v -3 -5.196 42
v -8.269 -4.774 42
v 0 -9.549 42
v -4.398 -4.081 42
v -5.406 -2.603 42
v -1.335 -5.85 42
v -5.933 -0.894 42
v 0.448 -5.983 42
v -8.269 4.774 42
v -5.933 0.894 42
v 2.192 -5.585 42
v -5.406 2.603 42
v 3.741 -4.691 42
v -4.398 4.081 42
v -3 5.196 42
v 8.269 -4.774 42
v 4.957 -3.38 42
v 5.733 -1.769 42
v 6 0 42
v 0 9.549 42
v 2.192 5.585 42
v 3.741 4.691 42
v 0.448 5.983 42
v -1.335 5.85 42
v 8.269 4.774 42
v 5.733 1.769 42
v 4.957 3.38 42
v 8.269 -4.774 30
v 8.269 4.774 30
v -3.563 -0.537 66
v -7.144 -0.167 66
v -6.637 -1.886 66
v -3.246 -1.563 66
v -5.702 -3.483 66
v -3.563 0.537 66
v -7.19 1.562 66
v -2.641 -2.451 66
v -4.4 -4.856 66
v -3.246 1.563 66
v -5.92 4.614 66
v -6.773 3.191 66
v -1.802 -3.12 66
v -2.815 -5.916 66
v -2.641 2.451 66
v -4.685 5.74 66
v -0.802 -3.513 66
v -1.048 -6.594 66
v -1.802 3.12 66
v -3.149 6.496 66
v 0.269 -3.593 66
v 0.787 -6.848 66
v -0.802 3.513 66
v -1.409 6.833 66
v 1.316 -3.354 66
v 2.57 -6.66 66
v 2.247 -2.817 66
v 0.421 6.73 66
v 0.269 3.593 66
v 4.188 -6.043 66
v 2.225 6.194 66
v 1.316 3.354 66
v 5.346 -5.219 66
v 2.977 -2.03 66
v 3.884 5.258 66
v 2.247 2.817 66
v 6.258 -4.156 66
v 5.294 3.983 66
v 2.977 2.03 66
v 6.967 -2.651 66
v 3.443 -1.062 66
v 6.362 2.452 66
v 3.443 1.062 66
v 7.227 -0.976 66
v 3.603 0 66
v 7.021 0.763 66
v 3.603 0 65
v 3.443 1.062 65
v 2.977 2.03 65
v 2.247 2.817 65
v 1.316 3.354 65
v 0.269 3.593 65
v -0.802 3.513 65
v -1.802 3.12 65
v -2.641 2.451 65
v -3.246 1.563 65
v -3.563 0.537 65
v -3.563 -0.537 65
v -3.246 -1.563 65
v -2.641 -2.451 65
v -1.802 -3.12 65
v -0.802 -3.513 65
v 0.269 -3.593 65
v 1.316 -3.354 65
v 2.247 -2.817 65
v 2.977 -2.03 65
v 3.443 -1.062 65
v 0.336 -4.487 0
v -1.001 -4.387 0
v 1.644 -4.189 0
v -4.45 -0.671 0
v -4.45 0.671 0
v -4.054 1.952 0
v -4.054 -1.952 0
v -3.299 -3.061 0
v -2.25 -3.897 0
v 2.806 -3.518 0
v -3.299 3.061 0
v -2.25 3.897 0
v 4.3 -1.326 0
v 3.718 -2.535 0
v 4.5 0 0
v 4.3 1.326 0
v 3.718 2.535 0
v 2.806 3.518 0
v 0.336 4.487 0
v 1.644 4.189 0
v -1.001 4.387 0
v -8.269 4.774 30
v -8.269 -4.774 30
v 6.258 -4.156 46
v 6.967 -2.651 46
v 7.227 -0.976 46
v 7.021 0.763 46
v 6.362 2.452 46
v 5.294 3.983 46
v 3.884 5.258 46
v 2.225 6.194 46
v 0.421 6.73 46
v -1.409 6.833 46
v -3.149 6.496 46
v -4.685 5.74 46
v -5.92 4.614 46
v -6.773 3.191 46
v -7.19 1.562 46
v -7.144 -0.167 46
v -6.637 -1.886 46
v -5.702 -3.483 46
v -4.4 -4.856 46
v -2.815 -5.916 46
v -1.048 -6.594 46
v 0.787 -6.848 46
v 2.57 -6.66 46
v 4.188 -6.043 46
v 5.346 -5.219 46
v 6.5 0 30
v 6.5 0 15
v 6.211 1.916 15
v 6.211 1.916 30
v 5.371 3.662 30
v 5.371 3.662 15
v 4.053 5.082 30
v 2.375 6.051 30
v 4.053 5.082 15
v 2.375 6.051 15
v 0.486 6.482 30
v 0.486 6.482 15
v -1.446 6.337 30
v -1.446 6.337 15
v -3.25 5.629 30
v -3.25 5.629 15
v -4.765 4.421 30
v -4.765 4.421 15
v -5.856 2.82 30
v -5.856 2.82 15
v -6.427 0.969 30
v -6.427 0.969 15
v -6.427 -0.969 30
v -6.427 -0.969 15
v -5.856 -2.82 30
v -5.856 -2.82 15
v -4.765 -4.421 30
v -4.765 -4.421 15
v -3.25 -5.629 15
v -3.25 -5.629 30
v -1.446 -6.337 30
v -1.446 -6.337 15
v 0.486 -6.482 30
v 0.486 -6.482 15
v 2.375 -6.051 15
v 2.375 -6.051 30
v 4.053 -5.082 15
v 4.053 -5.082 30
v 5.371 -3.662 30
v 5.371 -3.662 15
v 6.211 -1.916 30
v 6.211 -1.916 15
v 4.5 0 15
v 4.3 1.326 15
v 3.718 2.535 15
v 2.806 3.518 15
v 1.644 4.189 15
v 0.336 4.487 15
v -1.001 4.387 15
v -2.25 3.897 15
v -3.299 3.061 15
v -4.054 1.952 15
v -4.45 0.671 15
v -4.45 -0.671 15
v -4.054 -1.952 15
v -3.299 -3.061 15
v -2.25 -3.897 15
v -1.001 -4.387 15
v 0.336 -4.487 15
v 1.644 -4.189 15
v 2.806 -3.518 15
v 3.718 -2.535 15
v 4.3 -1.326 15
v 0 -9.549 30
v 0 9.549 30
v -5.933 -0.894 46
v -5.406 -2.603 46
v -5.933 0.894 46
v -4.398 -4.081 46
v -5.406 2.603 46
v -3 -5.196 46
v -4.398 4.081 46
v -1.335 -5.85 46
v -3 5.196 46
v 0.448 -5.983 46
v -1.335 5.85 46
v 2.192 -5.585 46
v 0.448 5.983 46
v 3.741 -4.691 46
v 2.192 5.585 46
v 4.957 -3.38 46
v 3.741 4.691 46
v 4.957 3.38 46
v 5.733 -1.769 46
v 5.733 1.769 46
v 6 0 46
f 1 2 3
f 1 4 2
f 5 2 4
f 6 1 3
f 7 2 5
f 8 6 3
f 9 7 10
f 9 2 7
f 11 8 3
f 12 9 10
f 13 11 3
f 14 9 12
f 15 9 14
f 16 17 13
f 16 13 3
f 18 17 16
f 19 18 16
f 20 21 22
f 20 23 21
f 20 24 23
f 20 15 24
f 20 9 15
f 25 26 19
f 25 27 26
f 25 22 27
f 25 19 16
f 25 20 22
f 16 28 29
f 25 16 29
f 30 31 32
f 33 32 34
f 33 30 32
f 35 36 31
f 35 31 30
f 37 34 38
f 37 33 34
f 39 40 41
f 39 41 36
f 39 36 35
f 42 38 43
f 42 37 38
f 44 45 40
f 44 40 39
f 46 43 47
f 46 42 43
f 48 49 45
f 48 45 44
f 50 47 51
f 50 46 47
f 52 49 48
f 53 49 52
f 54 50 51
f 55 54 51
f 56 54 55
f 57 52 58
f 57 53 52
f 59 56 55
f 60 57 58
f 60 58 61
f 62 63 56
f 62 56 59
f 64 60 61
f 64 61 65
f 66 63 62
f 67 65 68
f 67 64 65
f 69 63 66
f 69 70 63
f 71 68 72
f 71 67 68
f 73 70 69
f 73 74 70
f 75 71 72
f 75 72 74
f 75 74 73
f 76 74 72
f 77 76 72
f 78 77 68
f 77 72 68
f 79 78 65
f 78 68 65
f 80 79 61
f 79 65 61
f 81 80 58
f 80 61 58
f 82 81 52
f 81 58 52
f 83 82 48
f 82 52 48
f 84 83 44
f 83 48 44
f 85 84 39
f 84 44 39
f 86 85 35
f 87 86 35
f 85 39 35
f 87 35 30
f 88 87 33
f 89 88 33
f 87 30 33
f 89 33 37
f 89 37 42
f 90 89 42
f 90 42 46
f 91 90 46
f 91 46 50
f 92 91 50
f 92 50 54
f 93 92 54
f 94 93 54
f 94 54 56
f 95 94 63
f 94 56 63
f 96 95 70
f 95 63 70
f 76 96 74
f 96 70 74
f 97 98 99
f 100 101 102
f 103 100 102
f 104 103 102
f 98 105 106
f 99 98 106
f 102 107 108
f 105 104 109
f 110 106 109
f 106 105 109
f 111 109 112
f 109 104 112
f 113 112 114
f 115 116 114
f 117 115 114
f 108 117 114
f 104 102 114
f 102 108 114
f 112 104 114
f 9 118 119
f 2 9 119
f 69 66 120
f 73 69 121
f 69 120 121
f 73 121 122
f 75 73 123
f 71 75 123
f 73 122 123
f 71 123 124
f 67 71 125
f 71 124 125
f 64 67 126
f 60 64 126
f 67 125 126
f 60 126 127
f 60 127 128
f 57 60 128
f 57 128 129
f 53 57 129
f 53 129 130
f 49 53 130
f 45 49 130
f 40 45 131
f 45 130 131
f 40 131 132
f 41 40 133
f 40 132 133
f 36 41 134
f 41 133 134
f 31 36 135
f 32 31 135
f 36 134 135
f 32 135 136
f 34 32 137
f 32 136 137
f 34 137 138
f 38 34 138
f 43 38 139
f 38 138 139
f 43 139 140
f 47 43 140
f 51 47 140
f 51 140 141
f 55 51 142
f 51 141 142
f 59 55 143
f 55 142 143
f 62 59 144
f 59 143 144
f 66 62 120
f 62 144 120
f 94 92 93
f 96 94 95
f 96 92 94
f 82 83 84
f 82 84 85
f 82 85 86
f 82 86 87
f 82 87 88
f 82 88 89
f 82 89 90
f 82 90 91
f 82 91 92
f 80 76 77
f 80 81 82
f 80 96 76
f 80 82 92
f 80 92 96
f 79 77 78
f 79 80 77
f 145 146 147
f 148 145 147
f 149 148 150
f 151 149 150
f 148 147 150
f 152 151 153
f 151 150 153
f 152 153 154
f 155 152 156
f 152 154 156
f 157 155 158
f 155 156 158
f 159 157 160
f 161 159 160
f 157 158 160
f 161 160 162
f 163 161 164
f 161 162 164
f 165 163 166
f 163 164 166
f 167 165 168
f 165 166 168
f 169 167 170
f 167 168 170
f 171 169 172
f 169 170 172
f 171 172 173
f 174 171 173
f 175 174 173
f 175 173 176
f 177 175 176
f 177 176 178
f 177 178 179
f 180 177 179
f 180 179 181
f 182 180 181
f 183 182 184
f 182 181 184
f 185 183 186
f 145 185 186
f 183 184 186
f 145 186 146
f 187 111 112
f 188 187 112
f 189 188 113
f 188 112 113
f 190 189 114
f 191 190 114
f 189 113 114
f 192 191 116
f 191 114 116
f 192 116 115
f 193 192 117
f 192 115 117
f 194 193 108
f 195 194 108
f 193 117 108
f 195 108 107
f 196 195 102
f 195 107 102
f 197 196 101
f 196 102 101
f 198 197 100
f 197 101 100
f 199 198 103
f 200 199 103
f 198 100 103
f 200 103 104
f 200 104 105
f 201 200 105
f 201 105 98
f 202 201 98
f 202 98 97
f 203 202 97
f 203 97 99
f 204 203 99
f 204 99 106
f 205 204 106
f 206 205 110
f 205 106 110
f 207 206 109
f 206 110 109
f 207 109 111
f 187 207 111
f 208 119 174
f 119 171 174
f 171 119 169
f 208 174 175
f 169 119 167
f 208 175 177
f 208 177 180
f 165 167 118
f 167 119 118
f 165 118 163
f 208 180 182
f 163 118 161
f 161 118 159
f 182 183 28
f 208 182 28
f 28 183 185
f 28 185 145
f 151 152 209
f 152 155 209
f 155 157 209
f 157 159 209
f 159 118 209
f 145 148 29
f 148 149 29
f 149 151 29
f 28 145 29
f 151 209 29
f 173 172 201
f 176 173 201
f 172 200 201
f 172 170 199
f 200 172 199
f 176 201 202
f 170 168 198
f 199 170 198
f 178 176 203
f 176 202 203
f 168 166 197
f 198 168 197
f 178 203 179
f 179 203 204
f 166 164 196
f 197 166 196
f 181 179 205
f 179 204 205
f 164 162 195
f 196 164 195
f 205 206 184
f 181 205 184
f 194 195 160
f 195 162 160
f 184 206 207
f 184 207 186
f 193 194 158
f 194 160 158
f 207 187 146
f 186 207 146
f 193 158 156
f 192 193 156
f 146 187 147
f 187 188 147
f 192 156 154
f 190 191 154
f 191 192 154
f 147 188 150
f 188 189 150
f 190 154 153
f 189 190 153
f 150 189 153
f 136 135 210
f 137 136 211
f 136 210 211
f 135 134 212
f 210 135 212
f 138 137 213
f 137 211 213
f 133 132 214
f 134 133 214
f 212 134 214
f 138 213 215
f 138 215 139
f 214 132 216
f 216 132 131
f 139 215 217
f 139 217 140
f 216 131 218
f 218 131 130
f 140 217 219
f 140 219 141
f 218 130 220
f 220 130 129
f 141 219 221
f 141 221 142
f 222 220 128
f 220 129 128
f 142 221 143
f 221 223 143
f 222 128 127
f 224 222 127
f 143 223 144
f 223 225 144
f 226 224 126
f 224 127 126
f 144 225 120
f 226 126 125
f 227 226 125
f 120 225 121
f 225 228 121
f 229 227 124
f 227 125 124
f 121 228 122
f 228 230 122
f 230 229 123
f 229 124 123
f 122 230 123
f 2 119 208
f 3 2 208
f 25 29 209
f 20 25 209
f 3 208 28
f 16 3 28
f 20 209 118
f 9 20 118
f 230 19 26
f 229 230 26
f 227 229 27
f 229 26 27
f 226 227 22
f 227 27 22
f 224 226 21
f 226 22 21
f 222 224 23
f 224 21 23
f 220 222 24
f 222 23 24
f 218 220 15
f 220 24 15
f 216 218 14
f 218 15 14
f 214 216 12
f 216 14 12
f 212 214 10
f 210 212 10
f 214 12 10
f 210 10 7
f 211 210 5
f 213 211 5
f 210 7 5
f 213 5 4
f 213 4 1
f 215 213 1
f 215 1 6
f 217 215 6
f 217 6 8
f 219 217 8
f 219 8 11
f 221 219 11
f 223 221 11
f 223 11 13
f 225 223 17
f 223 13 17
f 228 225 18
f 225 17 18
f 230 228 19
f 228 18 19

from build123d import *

# Parameters (mm, degrees)
SKETCH_1_R          = 4.5
EXTRUDE_1_DEPTH     = 15
SKETCH_2_R          = 6.5
EXTRUDE_2_DEPTH     = 15
EXTRUDE_3_DEPTH     = 12
SKETCH_4_R          = 6
EXTRUDE_4_DEPTH     = 4
SKETCH_5_RX         = 7.512684998
SKETCH_5_RY         = 6.53508396
EXTRUDE_5_DEPTH     = 20
SKETCH_6_R          = 3.603234424
CUT_EXTRUDE_1_DEPTH = 1


with BuildPart() as part:
    # ｽｹｯﾁ1 → ﾎﾞｽ - 押し出し1 (new body)
    with BuildSketch(Plane.XY):
        Circle(SKETCH_1_R)
    extrude(amount=EXTRUDE_1_DEPTH)

    # ｽｹｯﾁ2 → ﾎﾞｽ - 押し出し2 (add)
    with BuildSketch(Plane.XY.offset(15)):
        Circle(SKETCH_2_R)
    extrude(amount=EXTRUDE_2_DEPTH)

    # ｽｹｯﾁ3 → ﾎﾞｽ - 押し出し3 (add)
    with BuildSketch(Plane.XY.offset(30)):
        Polygon((0, -9.548712613), (8.269427696, -4.774356306), (8.269427696, 4.774356306), (0, 9.548712613), (-8.269427696, 4.774356306), (-8.269427696, -4.774356306), align=None)
    extrude(amount=EXTRUDE_3_DEPTH)

    # ｽｹｯﾁ4 → ﾎﾞｽ - 押し出し4 (add)
    with BuildSketch(Plane.XY.offset(42)):
        Circle(SKETCH_4_R)
    extrude(amount=EXTRUDE_4_DEPTH)

    # ｽｹｯﾁ5 → ﾎﾞｽ - 押し出し5 (add)
    with BuildSketch(Plane.XY.offset(46)):
        with Locations(Location((0, 0), (0, 0, -33.587248831))):
            Ellipse(SKETCH_5_RX, SKETCH_5_RY)
    extrude(amount=EXTRUDE_5_DEPTH)

    # ｽｹｯﾁ6 → ｶｯﾄ - 押し出し1 (cut)
    with BuildSketch(Plane.XY.offset(66)):
        Circle(SKETCH_6_R)
    extrude(amount=-CUT_EXTRUDE_1_DEPTH, mode=Mode.SUBTRACT)


solid = part.part
